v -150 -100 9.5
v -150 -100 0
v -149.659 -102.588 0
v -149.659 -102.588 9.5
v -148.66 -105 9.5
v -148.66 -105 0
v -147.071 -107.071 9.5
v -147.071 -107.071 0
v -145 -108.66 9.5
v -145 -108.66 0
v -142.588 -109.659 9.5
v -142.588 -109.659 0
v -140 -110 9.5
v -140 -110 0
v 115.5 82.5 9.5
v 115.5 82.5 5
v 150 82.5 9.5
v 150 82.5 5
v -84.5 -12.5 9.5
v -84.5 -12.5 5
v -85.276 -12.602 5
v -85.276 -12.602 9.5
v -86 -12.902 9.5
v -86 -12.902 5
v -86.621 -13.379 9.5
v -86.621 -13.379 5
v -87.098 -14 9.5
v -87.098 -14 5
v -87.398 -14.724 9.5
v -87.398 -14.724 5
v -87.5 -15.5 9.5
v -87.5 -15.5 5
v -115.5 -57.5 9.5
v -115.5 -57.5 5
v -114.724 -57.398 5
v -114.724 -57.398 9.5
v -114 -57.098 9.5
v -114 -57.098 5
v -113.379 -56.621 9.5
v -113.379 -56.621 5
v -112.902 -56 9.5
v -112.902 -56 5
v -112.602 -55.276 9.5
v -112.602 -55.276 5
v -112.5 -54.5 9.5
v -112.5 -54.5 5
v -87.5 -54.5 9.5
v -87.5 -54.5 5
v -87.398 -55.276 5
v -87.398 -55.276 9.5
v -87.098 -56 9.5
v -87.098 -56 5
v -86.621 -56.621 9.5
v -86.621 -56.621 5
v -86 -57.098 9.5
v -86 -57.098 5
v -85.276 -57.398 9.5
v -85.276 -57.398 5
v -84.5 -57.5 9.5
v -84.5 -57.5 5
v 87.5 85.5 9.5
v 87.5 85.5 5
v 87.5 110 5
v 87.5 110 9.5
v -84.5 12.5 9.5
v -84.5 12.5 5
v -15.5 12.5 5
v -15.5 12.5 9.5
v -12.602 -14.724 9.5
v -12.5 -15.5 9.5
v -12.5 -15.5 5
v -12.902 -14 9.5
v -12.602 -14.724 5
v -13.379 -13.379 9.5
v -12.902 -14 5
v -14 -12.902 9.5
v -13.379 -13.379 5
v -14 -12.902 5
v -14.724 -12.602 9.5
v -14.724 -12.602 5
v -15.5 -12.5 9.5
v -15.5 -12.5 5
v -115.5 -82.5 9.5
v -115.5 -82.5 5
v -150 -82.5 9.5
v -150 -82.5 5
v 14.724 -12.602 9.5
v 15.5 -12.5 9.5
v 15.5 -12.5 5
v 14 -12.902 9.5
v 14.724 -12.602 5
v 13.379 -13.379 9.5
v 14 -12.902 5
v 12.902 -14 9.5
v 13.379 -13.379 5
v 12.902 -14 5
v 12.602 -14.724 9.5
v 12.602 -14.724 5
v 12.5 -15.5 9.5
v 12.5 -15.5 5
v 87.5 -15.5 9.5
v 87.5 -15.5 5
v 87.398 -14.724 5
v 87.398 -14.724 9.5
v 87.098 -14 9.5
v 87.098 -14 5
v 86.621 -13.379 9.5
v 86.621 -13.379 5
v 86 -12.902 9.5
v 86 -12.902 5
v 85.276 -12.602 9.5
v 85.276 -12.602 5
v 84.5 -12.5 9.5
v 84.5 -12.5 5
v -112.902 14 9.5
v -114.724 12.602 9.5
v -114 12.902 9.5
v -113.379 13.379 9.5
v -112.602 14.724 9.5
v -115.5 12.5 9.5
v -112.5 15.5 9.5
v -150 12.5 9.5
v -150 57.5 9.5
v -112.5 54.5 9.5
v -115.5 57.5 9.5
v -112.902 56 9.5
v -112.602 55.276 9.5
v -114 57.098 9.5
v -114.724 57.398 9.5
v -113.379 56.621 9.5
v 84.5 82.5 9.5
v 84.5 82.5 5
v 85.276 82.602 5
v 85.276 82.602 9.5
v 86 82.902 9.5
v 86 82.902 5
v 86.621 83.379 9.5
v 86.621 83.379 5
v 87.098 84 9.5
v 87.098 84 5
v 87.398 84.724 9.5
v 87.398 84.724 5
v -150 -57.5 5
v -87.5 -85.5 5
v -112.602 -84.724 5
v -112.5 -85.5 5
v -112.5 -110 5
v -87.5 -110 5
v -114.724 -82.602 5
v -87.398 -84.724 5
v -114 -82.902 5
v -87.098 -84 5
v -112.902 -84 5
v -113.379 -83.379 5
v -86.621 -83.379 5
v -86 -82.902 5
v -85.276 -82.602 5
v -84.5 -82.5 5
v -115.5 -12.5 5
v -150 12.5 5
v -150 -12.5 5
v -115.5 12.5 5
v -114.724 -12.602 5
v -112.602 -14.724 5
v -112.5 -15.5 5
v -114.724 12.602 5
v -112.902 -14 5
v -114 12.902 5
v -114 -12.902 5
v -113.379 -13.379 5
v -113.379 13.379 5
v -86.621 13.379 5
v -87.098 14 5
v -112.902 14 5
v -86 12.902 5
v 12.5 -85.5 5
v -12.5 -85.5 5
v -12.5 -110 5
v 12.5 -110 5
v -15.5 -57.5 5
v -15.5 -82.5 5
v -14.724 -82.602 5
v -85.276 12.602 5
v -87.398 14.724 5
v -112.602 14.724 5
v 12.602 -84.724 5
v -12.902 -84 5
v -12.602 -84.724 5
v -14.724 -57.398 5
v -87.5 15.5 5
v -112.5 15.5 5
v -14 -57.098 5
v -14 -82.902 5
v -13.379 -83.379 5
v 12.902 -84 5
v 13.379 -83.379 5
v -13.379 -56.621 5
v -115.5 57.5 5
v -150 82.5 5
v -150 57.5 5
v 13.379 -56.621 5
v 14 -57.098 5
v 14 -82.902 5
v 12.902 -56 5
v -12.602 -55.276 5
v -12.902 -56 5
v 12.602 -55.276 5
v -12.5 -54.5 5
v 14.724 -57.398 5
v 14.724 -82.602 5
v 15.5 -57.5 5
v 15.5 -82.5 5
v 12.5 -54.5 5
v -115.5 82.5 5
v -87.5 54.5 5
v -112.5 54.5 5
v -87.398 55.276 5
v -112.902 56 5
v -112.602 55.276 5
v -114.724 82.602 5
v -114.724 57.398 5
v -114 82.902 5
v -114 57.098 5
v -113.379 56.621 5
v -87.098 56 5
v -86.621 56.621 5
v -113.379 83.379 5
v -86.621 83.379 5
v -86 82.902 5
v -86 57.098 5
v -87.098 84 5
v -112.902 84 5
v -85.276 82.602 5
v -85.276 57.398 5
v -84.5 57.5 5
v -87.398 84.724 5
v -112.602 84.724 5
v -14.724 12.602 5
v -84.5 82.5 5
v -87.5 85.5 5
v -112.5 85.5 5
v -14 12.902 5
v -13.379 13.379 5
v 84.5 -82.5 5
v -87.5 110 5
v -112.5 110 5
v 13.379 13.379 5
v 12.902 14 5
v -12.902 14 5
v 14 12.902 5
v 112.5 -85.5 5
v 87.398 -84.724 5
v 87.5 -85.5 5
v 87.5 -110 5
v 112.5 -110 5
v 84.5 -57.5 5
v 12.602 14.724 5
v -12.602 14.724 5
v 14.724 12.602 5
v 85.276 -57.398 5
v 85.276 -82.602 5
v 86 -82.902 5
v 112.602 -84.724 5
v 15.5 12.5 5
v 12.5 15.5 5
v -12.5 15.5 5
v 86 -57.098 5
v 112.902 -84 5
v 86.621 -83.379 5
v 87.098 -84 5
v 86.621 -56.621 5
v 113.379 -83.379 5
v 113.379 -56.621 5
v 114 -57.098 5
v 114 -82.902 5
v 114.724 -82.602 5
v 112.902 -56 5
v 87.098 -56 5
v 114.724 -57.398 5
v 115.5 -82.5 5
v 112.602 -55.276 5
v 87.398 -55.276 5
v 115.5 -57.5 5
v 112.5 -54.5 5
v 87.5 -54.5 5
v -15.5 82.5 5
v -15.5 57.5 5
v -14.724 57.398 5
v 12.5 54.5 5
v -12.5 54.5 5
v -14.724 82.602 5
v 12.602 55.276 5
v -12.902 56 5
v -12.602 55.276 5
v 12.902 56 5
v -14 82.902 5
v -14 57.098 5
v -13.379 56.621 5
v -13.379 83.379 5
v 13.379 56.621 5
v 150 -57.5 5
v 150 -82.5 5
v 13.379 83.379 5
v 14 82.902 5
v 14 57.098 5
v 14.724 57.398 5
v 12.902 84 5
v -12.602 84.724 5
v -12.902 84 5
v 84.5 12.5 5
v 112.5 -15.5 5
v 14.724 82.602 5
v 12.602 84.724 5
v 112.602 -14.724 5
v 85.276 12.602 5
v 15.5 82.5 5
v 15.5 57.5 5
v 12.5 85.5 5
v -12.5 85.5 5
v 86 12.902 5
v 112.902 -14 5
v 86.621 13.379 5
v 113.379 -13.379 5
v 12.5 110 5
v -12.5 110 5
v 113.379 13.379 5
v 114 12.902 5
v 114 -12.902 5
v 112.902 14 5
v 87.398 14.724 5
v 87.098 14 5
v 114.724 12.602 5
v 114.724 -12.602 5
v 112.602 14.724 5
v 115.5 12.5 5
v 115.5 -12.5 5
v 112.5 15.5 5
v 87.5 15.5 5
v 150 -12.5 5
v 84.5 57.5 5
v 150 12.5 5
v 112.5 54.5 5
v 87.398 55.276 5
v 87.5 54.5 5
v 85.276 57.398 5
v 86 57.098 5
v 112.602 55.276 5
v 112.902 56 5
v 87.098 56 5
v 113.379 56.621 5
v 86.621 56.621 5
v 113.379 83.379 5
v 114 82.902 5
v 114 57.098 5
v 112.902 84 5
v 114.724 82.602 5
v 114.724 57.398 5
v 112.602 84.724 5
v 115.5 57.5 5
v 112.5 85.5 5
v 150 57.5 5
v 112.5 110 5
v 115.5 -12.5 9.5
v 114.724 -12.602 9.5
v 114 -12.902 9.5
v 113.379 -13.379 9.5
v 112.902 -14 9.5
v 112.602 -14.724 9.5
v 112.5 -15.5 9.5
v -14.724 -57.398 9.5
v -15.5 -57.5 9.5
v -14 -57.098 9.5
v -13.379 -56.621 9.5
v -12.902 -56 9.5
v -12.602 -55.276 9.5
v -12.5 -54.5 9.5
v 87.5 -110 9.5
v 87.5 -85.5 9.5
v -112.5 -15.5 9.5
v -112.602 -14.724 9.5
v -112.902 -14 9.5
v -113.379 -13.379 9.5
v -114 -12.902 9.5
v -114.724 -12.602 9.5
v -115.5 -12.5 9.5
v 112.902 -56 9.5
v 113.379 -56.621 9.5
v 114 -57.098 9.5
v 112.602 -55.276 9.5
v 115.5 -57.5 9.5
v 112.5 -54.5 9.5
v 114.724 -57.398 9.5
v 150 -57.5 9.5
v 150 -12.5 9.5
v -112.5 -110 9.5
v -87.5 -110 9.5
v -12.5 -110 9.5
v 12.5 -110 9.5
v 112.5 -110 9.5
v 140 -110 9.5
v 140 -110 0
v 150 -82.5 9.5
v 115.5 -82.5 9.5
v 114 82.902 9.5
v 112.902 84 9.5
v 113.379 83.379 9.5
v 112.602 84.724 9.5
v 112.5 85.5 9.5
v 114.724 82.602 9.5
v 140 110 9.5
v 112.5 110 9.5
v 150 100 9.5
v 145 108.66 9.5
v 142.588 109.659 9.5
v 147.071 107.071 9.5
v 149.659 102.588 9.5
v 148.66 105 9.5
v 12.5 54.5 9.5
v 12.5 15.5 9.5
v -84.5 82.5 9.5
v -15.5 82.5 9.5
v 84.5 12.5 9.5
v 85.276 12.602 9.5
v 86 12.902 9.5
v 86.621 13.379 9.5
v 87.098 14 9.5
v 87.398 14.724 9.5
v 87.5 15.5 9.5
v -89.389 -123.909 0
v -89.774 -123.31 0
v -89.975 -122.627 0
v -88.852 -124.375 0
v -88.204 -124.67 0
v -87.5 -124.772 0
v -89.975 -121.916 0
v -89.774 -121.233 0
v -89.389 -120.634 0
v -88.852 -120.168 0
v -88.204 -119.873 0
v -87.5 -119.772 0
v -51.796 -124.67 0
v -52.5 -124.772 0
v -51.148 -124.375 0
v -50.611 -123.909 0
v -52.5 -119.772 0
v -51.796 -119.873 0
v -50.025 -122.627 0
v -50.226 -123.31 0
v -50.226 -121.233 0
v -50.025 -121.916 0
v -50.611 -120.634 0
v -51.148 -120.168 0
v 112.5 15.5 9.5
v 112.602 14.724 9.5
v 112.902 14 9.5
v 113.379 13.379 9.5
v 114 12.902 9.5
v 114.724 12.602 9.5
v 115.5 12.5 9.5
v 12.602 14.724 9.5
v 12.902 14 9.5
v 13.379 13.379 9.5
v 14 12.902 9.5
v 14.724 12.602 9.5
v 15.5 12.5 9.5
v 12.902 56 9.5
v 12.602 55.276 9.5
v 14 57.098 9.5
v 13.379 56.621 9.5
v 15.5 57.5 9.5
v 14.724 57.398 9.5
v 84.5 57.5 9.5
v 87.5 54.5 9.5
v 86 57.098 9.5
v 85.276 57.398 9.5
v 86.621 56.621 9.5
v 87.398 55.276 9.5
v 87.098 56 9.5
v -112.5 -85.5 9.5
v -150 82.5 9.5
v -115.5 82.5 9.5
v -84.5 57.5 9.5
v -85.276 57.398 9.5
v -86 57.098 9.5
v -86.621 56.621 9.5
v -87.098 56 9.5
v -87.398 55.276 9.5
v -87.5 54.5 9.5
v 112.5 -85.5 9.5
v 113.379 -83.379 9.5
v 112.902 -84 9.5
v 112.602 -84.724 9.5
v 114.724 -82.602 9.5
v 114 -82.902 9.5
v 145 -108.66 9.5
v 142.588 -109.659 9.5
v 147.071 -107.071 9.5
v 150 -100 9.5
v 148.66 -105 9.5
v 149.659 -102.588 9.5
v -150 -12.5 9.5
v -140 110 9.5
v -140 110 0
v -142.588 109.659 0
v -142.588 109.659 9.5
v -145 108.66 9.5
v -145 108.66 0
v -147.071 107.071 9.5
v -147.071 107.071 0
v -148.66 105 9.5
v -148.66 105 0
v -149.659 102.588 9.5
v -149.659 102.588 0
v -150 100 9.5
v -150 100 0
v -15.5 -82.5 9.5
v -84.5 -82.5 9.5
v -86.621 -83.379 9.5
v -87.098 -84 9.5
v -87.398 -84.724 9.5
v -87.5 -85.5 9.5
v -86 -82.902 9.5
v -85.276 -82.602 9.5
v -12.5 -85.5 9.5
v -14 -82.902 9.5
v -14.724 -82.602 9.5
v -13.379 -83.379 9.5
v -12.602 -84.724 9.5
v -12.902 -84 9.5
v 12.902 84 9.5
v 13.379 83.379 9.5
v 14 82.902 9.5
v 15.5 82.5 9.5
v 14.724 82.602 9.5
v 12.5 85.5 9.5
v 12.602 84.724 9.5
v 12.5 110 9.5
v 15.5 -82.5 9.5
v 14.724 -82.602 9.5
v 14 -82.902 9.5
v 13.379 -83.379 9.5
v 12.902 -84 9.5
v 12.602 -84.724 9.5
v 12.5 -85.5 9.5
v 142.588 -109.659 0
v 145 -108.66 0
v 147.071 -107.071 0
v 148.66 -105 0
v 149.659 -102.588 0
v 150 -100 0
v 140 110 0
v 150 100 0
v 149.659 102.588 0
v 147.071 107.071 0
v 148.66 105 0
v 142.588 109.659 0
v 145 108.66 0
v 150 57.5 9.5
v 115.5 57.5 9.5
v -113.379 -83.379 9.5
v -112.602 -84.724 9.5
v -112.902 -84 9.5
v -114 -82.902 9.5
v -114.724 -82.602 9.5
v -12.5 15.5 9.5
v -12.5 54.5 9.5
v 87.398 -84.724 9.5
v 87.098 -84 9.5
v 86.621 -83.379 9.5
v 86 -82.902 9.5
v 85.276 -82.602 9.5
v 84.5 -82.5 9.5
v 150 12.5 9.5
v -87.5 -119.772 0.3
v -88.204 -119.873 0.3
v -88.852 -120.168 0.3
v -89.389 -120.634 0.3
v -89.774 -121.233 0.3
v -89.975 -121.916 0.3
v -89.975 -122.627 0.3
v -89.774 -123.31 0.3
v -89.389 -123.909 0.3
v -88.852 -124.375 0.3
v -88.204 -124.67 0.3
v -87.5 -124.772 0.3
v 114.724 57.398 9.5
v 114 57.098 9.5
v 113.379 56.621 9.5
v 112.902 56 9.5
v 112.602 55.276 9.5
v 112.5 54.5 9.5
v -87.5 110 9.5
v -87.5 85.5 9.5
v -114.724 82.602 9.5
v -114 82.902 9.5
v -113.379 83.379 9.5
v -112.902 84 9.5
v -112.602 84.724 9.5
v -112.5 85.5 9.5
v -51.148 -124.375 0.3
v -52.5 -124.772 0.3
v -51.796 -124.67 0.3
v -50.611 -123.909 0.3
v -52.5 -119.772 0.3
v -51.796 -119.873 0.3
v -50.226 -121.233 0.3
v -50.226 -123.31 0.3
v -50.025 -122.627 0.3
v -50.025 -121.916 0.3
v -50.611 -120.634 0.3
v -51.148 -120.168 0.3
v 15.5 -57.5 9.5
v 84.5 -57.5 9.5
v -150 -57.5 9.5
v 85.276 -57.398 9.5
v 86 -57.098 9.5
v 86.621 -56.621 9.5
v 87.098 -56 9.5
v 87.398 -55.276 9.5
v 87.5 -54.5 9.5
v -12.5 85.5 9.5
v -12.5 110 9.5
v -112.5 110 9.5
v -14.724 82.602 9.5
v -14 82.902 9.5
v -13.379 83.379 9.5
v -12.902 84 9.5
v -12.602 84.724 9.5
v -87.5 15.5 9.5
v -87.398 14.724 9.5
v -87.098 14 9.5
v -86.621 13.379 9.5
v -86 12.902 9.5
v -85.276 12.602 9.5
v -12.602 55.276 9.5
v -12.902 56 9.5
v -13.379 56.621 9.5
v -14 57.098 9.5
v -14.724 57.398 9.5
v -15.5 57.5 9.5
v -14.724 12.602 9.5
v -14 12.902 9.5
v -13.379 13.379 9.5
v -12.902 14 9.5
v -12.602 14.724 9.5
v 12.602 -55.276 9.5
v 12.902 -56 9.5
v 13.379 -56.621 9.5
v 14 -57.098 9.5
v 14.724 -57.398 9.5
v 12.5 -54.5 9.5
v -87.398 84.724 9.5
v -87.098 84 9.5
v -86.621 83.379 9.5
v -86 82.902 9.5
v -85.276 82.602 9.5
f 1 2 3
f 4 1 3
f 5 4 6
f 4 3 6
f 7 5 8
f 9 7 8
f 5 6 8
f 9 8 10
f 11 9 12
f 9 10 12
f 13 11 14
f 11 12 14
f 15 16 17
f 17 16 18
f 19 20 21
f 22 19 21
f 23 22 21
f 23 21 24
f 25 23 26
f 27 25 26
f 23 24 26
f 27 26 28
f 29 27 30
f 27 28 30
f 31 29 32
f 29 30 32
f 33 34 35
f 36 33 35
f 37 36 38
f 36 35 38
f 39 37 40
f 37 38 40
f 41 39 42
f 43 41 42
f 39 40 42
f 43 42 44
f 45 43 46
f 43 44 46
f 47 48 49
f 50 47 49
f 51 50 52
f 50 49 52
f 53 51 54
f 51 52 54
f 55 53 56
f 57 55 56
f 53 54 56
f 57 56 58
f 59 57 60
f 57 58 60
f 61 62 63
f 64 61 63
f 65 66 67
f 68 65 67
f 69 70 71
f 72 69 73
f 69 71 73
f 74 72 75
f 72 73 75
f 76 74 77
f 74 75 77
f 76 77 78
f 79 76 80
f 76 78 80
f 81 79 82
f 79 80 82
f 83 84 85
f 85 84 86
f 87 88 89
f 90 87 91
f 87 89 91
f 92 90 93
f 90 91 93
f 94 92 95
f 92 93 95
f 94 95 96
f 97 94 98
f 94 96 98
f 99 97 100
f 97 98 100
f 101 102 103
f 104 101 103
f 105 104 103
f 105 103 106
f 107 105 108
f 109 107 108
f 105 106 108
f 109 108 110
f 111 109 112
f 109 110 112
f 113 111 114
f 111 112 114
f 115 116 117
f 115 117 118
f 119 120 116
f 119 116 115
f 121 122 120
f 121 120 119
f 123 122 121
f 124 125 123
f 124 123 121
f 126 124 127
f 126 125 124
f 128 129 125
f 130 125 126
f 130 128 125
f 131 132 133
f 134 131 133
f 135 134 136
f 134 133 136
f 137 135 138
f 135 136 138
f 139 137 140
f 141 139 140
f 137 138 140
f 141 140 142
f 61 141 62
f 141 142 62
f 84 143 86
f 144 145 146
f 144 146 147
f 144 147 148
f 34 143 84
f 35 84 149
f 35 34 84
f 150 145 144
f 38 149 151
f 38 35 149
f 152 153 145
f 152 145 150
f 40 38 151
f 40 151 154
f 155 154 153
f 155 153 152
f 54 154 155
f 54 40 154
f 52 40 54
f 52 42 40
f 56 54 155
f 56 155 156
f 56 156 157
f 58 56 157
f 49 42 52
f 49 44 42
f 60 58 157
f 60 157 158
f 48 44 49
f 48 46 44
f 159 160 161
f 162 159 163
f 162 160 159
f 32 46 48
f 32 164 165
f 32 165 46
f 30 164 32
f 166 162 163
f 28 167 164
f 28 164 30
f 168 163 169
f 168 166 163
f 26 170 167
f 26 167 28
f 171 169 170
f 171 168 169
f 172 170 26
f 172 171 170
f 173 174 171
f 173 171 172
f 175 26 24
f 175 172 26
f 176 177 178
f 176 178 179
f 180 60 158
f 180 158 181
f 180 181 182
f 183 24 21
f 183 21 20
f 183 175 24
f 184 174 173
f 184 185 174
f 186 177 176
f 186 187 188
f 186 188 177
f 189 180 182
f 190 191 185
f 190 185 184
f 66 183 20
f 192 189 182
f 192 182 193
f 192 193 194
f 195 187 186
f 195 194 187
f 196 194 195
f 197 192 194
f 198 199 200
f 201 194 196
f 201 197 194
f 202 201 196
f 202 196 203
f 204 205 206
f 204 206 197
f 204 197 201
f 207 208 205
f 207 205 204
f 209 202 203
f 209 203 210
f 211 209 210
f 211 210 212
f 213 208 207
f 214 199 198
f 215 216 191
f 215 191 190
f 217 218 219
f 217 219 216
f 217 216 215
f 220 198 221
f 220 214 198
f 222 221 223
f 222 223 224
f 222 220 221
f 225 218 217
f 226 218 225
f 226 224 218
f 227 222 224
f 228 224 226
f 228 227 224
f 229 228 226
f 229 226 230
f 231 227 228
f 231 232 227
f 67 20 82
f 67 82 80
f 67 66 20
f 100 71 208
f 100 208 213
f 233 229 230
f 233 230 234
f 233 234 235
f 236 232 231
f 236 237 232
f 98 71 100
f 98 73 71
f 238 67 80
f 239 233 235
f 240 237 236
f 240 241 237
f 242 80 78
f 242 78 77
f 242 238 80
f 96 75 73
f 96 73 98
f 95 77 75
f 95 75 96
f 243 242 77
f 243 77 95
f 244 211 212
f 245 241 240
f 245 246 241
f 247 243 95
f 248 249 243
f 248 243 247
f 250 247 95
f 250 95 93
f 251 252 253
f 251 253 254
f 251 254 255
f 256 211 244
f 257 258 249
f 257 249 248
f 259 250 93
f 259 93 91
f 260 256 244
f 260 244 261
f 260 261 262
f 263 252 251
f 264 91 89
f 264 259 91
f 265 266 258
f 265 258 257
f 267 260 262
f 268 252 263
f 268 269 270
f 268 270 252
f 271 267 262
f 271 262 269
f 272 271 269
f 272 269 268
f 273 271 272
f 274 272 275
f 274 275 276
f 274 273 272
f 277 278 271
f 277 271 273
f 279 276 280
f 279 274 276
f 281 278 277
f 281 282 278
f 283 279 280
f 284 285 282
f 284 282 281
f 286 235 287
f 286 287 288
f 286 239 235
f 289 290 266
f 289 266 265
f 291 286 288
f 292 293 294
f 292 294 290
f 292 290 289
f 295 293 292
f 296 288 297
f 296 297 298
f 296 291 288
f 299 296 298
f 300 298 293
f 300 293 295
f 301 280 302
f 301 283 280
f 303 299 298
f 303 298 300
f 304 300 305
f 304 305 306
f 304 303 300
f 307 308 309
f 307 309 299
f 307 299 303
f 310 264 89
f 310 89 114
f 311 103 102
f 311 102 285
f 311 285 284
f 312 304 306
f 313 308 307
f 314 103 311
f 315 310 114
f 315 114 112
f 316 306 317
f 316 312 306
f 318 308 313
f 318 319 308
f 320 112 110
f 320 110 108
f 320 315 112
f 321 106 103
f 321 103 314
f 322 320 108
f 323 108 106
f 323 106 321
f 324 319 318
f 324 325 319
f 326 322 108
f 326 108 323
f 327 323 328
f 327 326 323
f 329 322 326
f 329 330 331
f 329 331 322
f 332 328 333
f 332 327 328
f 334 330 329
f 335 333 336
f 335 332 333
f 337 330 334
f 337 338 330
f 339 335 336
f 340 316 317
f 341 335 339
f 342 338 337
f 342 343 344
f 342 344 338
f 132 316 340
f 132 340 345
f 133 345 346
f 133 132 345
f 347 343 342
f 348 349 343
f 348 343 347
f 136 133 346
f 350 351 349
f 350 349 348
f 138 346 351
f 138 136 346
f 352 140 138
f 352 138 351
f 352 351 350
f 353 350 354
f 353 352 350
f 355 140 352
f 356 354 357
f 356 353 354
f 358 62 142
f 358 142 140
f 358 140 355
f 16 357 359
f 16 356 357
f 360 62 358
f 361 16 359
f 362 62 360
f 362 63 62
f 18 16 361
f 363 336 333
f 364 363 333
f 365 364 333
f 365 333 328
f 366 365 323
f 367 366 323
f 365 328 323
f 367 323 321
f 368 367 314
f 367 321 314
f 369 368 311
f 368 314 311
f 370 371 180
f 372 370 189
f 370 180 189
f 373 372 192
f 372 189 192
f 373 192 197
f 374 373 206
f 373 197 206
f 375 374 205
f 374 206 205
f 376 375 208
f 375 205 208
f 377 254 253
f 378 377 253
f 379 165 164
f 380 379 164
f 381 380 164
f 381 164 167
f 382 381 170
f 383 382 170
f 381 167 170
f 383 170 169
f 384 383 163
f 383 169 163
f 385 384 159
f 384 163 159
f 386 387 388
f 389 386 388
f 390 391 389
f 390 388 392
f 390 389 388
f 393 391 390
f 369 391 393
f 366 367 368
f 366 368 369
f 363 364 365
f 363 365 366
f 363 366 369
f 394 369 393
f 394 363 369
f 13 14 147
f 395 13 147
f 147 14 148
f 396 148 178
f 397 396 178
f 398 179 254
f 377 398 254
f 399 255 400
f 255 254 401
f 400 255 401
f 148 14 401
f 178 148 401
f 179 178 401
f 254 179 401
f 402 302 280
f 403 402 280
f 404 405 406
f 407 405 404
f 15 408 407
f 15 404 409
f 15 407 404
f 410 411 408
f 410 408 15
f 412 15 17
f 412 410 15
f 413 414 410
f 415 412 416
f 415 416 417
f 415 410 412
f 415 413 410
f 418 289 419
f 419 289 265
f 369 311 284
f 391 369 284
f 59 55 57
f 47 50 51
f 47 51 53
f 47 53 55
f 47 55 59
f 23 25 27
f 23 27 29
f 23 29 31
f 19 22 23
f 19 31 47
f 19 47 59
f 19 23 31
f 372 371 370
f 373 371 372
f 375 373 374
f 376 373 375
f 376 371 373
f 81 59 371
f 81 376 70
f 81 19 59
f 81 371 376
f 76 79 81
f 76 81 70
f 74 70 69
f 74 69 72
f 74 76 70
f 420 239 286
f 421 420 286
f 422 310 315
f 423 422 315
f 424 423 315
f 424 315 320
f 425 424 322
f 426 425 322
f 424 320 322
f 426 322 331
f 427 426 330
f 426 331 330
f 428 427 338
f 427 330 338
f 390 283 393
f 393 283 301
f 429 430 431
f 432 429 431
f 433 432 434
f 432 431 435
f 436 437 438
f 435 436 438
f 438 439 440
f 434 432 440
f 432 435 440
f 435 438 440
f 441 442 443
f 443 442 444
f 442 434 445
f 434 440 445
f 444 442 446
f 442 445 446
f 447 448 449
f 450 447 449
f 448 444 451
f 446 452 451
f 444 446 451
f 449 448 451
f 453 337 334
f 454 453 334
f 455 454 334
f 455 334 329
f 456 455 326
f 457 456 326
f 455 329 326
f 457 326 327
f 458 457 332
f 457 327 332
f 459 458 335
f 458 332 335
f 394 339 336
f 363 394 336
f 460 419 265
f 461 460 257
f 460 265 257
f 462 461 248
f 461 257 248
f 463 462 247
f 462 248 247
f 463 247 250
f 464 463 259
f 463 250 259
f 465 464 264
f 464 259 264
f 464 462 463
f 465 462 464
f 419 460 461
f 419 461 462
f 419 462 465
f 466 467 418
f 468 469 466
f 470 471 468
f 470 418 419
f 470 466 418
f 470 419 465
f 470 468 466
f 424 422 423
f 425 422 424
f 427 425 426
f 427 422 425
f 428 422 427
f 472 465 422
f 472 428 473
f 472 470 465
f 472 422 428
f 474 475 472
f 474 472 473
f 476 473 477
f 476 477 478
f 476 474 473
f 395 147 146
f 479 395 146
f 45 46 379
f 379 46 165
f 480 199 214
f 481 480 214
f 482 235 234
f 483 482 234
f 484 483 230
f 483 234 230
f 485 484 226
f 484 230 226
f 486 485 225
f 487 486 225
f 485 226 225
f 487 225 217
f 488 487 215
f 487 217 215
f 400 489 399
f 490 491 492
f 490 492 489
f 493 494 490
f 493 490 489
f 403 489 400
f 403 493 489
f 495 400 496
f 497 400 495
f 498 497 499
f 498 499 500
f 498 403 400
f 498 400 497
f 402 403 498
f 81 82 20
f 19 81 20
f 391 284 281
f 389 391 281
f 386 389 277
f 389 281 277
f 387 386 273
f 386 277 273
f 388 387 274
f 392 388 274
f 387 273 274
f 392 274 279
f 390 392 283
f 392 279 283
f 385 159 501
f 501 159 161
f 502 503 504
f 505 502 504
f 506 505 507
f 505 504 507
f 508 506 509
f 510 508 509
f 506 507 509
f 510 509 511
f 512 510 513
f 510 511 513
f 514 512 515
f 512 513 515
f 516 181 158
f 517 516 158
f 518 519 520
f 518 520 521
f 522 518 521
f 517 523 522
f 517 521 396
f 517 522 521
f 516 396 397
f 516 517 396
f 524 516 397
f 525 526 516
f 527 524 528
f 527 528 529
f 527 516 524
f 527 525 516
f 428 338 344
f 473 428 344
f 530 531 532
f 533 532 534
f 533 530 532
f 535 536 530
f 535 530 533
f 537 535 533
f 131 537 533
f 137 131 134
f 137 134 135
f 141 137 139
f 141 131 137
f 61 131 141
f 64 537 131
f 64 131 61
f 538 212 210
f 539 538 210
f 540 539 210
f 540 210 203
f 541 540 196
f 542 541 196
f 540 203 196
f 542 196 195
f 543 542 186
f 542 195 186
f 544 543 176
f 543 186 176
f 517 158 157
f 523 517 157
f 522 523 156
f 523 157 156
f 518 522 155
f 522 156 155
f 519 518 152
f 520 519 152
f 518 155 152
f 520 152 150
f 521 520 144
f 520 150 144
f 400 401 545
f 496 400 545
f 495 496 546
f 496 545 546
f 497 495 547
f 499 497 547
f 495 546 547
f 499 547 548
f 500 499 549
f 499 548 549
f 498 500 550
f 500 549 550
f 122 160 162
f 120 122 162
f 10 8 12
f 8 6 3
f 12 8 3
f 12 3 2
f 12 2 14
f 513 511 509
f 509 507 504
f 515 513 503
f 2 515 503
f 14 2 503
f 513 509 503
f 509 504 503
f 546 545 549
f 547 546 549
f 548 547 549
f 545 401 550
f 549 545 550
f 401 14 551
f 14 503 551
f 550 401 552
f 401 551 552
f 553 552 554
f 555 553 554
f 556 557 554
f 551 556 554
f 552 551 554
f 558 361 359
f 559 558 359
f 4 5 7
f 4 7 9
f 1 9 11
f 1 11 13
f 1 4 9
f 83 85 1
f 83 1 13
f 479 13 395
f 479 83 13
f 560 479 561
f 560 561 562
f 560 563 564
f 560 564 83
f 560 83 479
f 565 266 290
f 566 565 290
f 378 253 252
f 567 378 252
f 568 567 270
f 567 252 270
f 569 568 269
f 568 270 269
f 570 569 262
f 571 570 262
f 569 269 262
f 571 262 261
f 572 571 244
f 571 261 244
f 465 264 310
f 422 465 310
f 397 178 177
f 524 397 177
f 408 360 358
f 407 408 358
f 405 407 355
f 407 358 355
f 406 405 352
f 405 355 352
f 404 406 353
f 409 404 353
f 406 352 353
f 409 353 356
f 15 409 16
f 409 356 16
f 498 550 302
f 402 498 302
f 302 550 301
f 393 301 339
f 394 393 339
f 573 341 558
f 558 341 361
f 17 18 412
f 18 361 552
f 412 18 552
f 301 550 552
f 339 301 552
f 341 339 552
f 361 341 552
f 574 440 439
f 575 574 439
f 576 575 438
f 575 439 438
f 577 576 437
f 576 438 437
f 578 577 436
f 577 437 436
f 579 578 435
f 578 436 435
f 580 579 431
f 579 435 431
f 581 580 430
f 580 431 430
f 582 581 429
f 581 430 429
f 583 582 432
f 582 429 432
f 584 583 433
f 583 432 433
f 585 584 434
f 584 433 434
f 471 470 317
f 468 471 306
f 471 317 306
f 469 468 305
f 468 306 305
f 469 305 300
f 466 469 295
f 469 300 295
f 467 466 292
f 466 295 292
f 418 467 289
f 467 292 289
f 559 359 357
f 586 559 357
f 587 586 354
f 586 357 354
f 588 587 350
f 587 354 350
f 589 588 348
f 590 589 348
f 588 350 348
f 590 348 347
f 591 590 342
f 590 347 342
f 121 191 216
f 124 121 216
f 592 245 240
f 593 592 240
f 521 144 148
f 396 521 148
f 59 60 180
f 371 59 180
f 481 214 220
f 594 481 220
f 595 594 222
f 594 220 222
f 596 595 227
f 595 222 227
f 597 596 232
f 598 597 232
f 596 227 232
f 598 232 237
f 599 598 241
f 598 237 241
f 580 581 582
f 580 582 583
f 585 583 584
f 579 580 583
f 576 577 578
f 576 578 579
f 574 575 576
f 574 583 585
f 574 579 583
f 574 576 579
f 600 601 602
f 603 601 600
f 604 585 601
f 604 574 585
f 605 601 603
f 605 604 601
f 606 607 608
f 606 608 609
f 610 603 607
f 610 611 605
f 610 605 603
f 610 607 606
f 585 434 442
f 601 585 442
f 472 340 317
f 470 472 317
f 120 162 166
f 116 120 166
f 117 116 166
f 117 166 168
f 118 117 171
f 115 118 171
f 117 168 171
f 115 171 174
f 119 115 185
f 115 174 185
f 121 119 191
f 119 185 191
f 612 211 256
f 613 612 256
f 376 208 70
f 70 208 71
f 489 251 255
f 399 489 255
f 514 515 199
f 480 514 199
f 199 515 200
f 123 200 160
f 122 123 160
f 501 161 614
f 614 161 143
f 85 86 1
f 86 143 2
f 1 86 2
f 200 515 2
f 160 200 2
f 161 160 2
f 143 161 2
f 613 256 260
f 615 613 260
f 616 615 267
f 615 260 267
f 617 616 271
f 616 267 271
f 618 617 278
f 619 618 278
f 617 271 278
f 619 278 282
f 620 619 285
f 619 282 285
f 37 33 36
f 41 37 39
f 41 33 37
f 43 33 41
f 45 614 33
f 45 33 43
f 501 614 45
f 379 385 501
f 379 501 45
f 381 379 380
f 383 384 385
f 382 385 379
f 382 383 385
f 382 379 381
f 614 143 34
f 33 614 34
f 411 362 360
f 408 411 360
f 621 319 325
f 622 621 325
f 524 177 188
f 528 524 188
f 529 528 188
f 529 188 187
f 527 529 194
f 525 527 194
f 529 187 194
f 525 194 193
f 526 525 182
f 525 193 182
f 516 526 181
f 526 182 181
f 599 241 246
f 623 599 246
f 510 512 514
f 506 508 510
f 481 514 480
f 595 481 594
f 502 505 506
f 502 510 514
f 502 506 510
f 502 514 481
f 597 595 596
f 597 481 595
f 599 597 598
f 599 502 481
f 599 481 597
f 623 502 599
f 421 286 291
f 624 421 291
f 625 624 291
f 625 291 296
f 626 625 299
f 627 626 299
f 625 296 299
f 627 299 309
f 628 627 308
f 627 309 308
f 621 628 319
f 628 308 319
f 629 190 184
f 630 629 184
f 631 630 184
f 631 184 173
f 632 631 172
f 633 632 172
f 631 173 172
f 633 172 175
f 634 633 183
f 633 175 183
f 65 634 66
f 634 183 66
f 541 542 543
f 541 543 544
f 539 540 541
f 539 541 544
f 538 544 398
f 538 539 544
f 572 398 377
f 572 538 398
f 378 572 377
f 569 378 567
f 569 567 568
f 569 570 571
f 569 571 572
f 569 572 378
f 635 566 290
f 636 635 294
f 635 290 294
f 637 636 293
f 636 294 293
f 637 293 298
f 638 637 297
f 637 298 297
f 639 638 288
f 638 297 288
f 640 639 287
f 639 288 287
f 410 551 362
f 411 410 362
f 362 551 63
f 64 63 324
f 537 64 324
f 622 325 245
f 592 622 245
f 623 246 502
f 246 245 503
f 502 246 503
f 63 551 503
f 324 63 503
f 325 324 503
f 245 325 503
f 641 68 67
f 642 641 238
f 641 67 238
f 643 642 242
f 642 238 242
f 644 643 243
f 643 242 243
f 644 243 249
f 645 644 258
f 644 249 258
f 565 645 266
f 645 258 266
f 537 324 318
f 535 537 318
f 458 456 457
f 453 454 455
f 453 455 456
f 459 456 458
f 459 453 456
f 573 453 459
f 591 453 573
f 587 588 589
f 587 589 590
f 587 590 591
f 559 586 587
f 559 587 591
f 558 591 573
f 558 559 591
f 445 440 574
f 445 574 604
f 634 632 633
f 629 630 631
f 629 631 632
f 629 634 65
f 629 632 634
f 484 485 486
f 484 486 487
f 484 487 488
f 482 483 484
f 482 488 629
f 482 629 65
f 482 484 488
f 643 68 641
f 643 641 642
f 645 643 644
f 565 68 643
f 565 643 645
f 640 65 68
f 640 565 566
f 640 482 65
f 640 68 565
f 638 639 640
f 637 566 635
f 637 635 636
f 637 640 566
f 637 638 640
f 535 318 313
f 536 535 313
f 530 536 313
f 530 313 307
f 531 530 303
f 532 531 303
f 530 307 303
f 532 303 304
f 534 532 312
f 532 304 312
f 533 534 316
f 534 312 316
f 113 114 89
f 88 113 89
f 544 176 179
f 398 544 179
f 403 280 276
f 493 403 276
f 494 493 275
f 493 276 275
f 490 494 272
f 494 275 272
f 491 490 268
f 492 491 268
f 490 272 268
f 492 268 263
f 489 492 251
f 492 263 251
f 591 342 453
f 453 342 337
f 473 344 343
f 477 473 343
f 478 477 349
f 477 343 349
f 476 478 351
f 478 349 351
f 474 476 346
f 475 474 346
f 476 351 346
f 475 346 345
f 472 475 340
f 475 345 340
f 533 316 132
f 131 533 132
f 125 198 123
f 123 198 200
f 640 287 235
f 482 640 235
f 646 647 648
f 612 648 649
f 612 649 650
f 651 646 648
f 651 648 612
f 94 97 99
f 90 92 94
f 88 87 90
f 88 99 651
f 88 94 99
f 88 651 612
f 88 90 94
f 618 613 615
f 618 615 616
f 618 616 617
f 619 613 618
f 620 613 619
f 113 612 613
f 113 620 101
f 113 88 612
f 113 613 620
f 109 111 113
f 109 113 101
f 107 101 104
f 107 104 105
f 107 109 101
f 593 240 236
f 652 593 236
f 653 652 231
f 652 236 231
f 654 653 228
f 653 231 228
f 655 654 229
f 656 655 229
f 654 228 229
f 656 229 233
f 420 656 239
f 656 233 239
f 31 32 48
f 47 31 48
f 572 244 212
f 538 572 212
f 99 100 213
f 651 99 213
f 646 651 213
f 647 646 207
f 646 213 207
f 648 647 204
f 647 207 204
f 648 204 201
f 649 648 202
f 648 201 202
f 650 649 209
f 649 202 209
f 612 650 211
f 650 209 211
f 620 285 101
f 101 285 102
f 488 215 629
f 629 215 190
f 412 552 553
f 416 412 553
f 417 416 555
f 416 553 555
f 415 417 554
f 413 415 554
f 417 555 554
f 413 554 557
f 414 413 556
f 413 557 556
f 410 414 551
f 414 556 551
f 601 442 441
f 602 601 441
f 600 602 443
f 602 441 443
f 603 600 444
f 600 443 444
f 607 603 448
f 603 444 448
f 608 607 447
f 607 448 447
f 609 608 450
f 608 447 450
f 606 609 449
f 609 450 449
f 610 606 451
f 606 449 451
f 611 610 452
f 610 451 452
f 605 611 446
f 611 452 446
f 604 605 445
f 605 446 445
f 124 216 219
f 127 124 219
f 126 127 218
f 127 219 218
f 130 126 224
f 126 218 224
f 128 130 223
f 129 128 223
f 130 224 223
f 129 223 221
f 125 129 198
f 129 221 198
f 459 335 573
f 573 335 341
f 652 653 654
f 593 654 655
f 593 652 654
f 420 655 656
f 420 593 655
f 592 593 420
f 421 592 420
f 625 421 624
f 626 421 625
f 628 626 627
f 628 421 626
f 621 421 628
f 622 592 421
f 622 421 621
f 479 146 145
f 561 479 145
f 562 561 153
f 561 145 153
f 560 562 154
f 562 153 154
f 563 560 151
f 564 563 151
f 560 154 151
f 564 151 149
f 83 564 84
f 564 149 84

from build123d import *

# Parameters (mm, degrees)
F1_DEPTH = 5
F2_DEPTH = 9.5
F0_W     = 35
F0_H     = 5
F3_DEPTH = 0.3


with BuildPart() as f1:
    # F0 (on Top) → F1 (new body)
    with BuildSketch(Plane.XY):
        with BuildLine():
            Line((-150, 100), (-150, 82.5))
            Line((-150, 82.5), (-115.5, 82.5))
            ThreePointArc((-115.5, 82.5), (-113.37868, 83.37868), (-112.5, 85.5))
            Line((-112.5, 85.5), (-112.5, 110))
            Line((-112.5, 110), (-140, 110))
            ThreePointArc((-140, 110), (-147.071068, 107.071068), (-150, 100))
        make_face()
        with BuildLine():
            Line((87.5, -110), (112.5, -110))
            Line((112.5, -110), (112.5, -85.5))
            ThreePointArc((112.5, -85.5), (113.37868, -83.37868), (115.5, -82.5))
            Line((115.5, -82.5), (150, -82.5))
            Line((150, -82.5), (150, -57.5))
            Line((150, -57.5), (115.5, -57.5))
            ThreePointArc((115.5, -57.5), (113.37868, -56.62132), (112.5, -54.5))
            Line((112.5, -54.5), (112.5, -15.5))
            ThreePointArc((112.5, -15.5), (113.37868, -13.37868), (115.5, -12.5))
            Line((115.5, -12.5), (150, -12.5))
            Line((150, -12.5), (150, 12.5))
            Line((150, 12.5), (115.5, 12.5))
            ThreePointArc((115.5, 12.5), (113.37868, 13.37868), (112.5, 15.5))
            Line((112.5, 15.5), (112.5, 54.5))
            ThreePointArc((112.5, 54.5), (113.37868, 56.62132), (115.5, 57.5))
            Line((115.5, 57.5), (150, 57.5))
            Line((150, 57.5), (150, 82.5))
            Line((150, 82.5), (115.5, 82.5))
            ThreePointArc((115.5, 82.5), (113.37868, 83.37868), (112.5, 85.5))
            Line((112.5, 85.5), (112.5, 110))
            Line((112.5, 110), (87.5, 110))
            Line((87.5, 110), (87.5, 85.5))
            ThreePointArc((87.5, 85.5), (86.62132, 83.37868), (84.5, 82.5))
            Line((84.5, 82.5), (15.5, 82.5))
            ThreePointArc((15.5, 82.5), (13.37868, 83.37868), (12.5, 85.5))
            Line((12.5, 85.5), (12.5, 110))
            Line((12.5, 110), (-12.5, 110))
            Line((-12.5, 110), (-12.5, 85.5))
            ThreePointArc((-12.5, 85.5), (-13.37868, 83.37868), (-15.5, 82.5))
            Line((-15.5, 82.5), (-84.5, 82.5))
            ThreePointArc((-84.5, 82.5), (-86.62132, 83.37868), (-87.5, 85.5))
            Line((-87.5, 85.5), (-87.5, 110))
            Line((-87.5, 110), (-112.5, 110))
            Line((-112.5, 110), (-112.5, 85.5))
            ThreePointArc((-112.5, 85.5), (-113.37868, 83.37868), (-115.5, 82.5))
            Line((-115.5, 82.5), (-150, 82.5))
            Line((-150, 82.5), (-150, 57.5))
            Line((-150, 57.5), (-115.5, 57.5))
            ThreePointArc((-115.5, 57.5), (-113.37868, 56.62132), (-112.5, 54.5))
            Line((-112.5, 54.5), (-112.5, 15.5))
            ThreePointArc((-112.5, 15.5), (-113.37868, 13.37868), (-115.5, 12.5))
            Line((-115.5, 12.5), (-150, 12.5))
            Line((-150, 12.5), (-150, -12.5))
            Line((-150, -12.5), (-115.5, -12.5))
            ThreePointArc((-115.5, -12.5), (-113.37868, -13.37868), (-112.5, -15.5))
            Line((-112.5, -15.5), (-112.5, -54.5))
            ThreePointArc((-112.5, -54.5), (-113.37868, -56.62132), (-115.5, -57.5))
            Line((-115.5, -57.5), (-150, -57.5))
            Line((-150, -57.5), (-150, -82.5))
            Line((-150, -82.5), (-115.5, -82.5))
            ThreePointArc((-115.5, -82.5), (-113.37868, -83.37868), (-112.5, -85.5))
            Line((-112.5, -85.5), (-112.5, -110))
            Line((-112.5, -110), (-87.5, -110))
            Line((-87.5, -110), (-87.5, -85.5))
            ThreePointArc((-87.5, -85.5), (-86.62132, -83.37868), (-84.5, -82.5))
            Line((-84.5, -82.5), (-15.5, -82.5))
            ThreePointArc((-15.5, -82.5), (-13.37868, -83.37868), (-12.5, -85.5))
            Line((-12.5, -85.5), (-12.5, -110))
            Line((-12.5, -110), (12.5, -110))
            Line((12.5, -110), (12.5, -85.5))
            ThreePointArc((12.5, -85.5), (13.37868, -83.37868), (15.5, -82.5))
            Line((15.5, -82.5), (84.5, -82.5))
            ThreePointArc((84.5, -82.5), (86.62132, -83.37868), (87.5, -85.5))
            Line((87.5, -85.5), (87.5, -110))
        make_face()
        with BuildLine():
            ThreePointArc((-87.5, -15.5), (-86.62132, -13.37868), (-84.5, -12.5))
            Line((-84.5, -12.5), (-15.5, -12.5))
            ThreePointArc((-15.5, -12.5), (-13.37868, -13.37868), (-12.5, -15.5))
            Line((-12.5, -15.5), (-12.5, -54.5))
            ThreePointArc((-12.5, -54.5), (-13.37868, -56.62132), (-15.5, -57.5))
            Line((-15.5, -57.5), (-84.5, -57.5))
            ThreePointArc((-84.5, -57.5), (-86.62132, -56.62132), (-87.5, -54.5))
            Line((-87.5, -54.5), (-87.5, -15.5))
        make_face(mode=Mode.SUBTRACT)
        with BuildLine():
            Line((12.5, -54.5), (12.5, -15.5))
            ThreePointArc((12.5, -15.5), (13.37868, -13.37868), (15.5, -12.5))
            Line((15.5, -12.5), (84.5, -12.5))
            ThreePointArc((84.5, -12.5), (86.62132, -13.37868), (87.5, -15.5))
            Line((87.5, -15.5), (87.5, -54.5))
            ThreePointArc((87.5, -54.5), (86.62132, -56.62132), (84.5, -57.5))
            Line((84.5, -57.5), (15.5, -57.5))
            ThreePointArc((15.5, -57.5), (13.37868, -56.62132), (12.5, -54.5))
        make_face(mode=Mode.SUBTRACT)
        with BuildLine():
            ThreePointArc((-87.5, 54.5), (-86.62132, 56.62132), (-84.5, 57.5))
            Line((-84.5, 57.5), (-15.5, 57.5))
            ThreePointArc((-15.5, 57.5), (-13.37868, 56.62132), (-12.5, 54.5))
            Line((-12.5, 54.5), (-12.5, 15.5))
            ThreePointArc((-12.5, 15.5), (-13.37868, 13.37868), (-15.5, 12.5))
            Line((-15.5, 12.5), (-84.5, 12.5))
            ThreePointArc((-84.5, 12.5), (-86.62132, 13.37868), (-87.5, 15.5))
            Line((-87.5, 15.5), (-87.5, 54.5))
        make_face(mode=Mode.SUBTRACT)
        with BuildLine():
            Line((12.5, 15.5), (12.5, 54.5))
            ThreePointArc((12.5, 54.5), (13.37868, 56.62132), (15.5, 57.5))
            Line((15.5, 57.5), (84.5, 57.5))
            ThreePointArc((84.5, 57.5), (86.62132, 56.62132), (87.5, 54.5))
            Line((87.5, 54.5), (87.5, 15.5))
            ThreePointArc((87.5, 15.5), (86.62132, 13.37868), (84.5, 12.5))
            Line((84.5, 12.5), (15.5, 12.5))
            ThreePointArc((15.5, 12.5), (13.37868, 13.37868), (12.5, 15.5))
        make_face(mode=Mode.SUBTRACT)
        with BuildLine():
            Line((-12.5, 85.5), (-12.5, 110))
            Line((-12.5, 110), (-87.5, 110))
            Line((-87.5, 110), (-87.5, 85.5))
            ThreePointArc((-87.5, 85.5), (-86.62132, 83.37868), (-84.5, 82.5))
            Line((-84.5, 82.5), (-15.5, 82.5))
            ThreePointArc((-15.5, 82.5), (-13.37868, 83.37868), (-12.5, 85.5))
        make_face()
        with BuildLine():
            Line((87.5, 85.5), (87.5, 110))
            Line((87.5, 110), (12.5, 110))
            Line((12.5, 110), (12.5, 85.5))
            ThreePointArc((12.5, 85.5), (13.37868, 83.37868), (15.5, 82.5))
            Line((15.5, 82.5), (84.5, 82.5))
            ThreePointArc((84.5, 82.5), (86.62132, 83.37868), (87.5, 85.5))
        make_face()
        with BuildLine():
            Line((115.5, 82.5), (150, 82.5))
            Line((150, 82.5), (150, 100))
            ThreePointArc((150, 100), (147.071068, 107.071068), (140, 110))
            Line((140, 110), (112.5, 110))
            Line((112.5, 110), (112.5, 85.5))
            ThreePointArc((112.5, 85.5), (113.37868, 83.37868), (115.5, 82.5))
        make_face()
        with BuildLine():
            Line((115.5, 12.5), (150, 12.5))
            Line((150, 12.5), (150, 57.5))
            Line((150, 57.5), (115.5, 57.5))
            ThreePointArc((115.5, 57.5), (113.37868, 56.62132), (112.5, 54.5))
            Line((112.5, 54.5), (112.5, 15.5))
            ThreePointArc((112.5, 15.5), (113.37868, 13.37868), (115.5, 12.5))
        make_face()
        with BuildLine():
            ThreePointArc((15.5, 57.5), (13.37868, 56.62132), (12.5, 54.5))
            Line((12.5, 54.5), (12.5, 15.5))
            ThreePointArc((12.5, 15.5), (13.37868, 13.37868), (15.5, 12.5))
            Line((15.5, 12.5), (84.5, 12.5))
            ThreePointArc((84.5, 12.5), (86.62132, 13.37868), (87.5, 15.5))
            Line((87.5, 15.5), (87.5, 54.5))
            ThreePointArc((87.5, 54.5), (86.62132, 56.62132), (84.5, 57.5))
            Line((84.5, 57.5), (15.5, 57.5))
        make_face()
        with BuildLine():
            Line((-15.5, 57.5), (-84.5, 57.5))
            ThreePointArc((-84.5, 57.5), (-86.62132, 56.62132), (-87.5, 54.5))
            Line((-87.5, 54.5), (-87.5, 15.5))
            ThreePointArc((-87.5, 15.5), (-86.62132, 13.37868), (-84.5, 12.5))
            Line((-84.5, 12.5), (-15.5, 12.5))
            ThreePointArc((-15.5, 12.5), (-13.37868, 13.37868), (-12.5, 15.5))
            Line((-12.5, 15.5), (-12.5, 54.5))
            ThreePointArc((-12.5, 54.5), (-13.37868, 56.62132), (-15.5, 57.5))
        make_face()
        with BuildLine():
            Line((-150, 57.5), (-150, 12.5))
            Line((-150, 12.5), (-115.5, 12.5))
            ThreePointArc((-115.5, 12.5), (-113.37868, 13.37868), (-112.5, 15.5))
            Line((-112.5, 15.5), (-112.5, 54.5))
            ThreePointArc((-112.5, 54.5), (-113.37868, 56.62132), (-115.5, 57.5))
            Line((-115.5, 57.5), (-150, 57.5))
        make_face()
        with BuildLine():
            Line((-150, -12.5), (-150, -57.5))
            Line((-150, -57.5), (-115.5, -57.5))
            ThreePointArc((-115.5, -57.5), (-113.37868, -56.62132), (-112.5, -54.5))
            Line((-112.5, -54.5), (-112.5, -15.5))
            ThreePointArc((-112.5, -15.5), (-113.37868, -13.37868), (-115.5, -12.5))
            Line((-115.5, -12.5), (-150, -12.5))
        make_face()
        with BuildLine():
            Line((-15.5, -12.5), (-84.5, -12.5))
            ThreePointArc((-84.5, -12.5), (-86.62132, -13.37868), (-87.5, -15.5))
            Line((-87.5, -15.5), (-87.5, -54.5))
            ThreePointArc((-87.5, -54.5), (-86.62132, -56.62132), (-84.5, -57.5))
            Line((-84.5, -57.5), (-15.5, -57.5))
            ThreePointArc((-15.5, -57.5), (-13.37868, -56.62132), (-12.5, -54.5))
            Line((-12.5, -54.5), (-12.5, -15.5))
            ThreePointArc((-12.5, -15.5), (-13.37868, -13.37868), (-15.5, -12.5))
        make_face()
        with BuildLine():
            ThreePointArc((15.5, -12.5), (13.37868, -13.37868), (12.5, -15.5))
            Line((12.5, -15.5), (12.5, -54.5))
            ThreePointArc((12.5, -54.5), (13.37868, -56.62132), (15.5, -57.5))
            Line((15.5, -57.5), (84.5, -57.5))
            ThreePointArc((84.5, -57.5), (86.62132, -56.62132), (87.5, -54.5))
            Line((87.5, -54.5), (87.5, -15.5))
            ThreePointArc((87.5, -15.5), (86.62132, -13.37868), (84.5, -12.5))
            Line((84.5, -12.5), (15.5, -12.5))
        make_face()
        with BuildLine():
            Line((115.5, -57.5), (150, -57.5))
            Line((150, -57.5), (150, -12.5))
            Line((150, -12.5), (115.5, -12.5))
            ThreePointArc((115.5, -12.5), (113.37868, -13.37868), (112.5, -15.5))
            Line((112.5, -15.5), (112.5, -54.5))
            ThreePointArc((112.5, -54.5), (113.37868, -56.62132), (115.5, -57.5))
        make_face()
        with BuildLine():
            Line((112.5, -110), (140, -110))
            ThreePointArc((140, -110), (147.071068, -107.071068), (150, -100))
            Line((150, -100), (150, -82.5))
            Line((150, -82.5), (115.5, -82.5))
            ThreePointArc((115.5, -82.5), (113.37868, -83.37868), (112.5, -85.5))
            Line((112.5, -85.5), (112.5, -110))
        make_face()
        with BuildLine():
            Line((12.5, -110), (87.5, -110))
            Line((87.5, -110), (87.5, -85.5))
            ThreePointArc((87.5, -85.5), (86.62132, -83.37868), (84.5, -82.5))
            Line((84.5, -82.5), (15.5, -82.5))
            ThreePointArc((15.5, -82.5), (13.37868, -83.37868), (12.5, -85.5))
            Line((12.5, -85.5), (12.5, -110))
        make_face()
        with BuildLine():
            Line((-87.5, -110), (-12.5, -110))
            Line((-12.5, -110), (-12.5, -85.5))
            ThreePointArc((-12.5, -85.5), (-13.37868, -83.37868), (-15.5, -82.5))
            Line((-15.5, -82.5), (-84.5, -82.5))
            ThreePointArc((-84.5, -82.5), (-86.62132, -83.37868), (-87.5, -85.5))
            Line((-87.5, -85.5), (-87.5, -110))
        make_face()
        with BuildLine():
            Line((-140, -110), (-112.5, -110))
            Line((-112.5, -110), (-112.5, -85.5))
            ThreePointArc((-112.5, -85.5), (-113.37868, -83.37868), (-115.5, -82.5))
            Line((-115.5, -82.5), (-150, -82.5))
            Line((-150, -82.5), (-150, -100))
            ThreePointArc((-150, -100), (-147.071068, -107.071068), (-140, -110))
        make_face()
    extrude(amount=F1_DEPTH)

    # F0 (on Top) → F2 (join)
    with BuildSketch(Plane.XY):
        with BuildLine():
            Line((-150, 57.5), (-150, 12.5))
            Line((-150, 12.5), (-115.5, 12.5))
            ThreePointArc((-115.5, 12.5), (-113.37868, 13.37868), (-112.5, 15.5))
            Line((-112.5, 15.5), (-112.5, 54.5))
            ThreePointArc((-112.5, 54.5), (-113.37868, 56.62132), (-115.5, 57.5))
            Line((-115.5, 57.5), (-150, 57.5))
        make_face()
        with BuildLine():
            Line((-150, 100), (-150, 82.5))
            Line((-150, 82.5), (-115.5, 82.5))
            ThreePointArc((-115.5, 82.5), (-113.37868, 83.37868), (-112.5, 85.5))
            Line((-112.5, 85.5), (-112.5, 110))
            Line((-112.5, 110), (-140, 110))
            ThreePointArc((-140, 110), (-147.071068, 107.071068), (-150, 100))
        make_face()
        with BuildLine():
            Line((-12.5, 85.5), (-12.5, 110))
            Line((-12.5, 110), (-87.5, 110))
            Line((-87.5, 110), (-87.5, 85.5))
            ThreePointArc((-87.5, 85.5), (-86.62132, 83.37868), (-84.5, 82.5))
            Line((-84.5, 82.5), (-15.5, 82.5))
            ThreePointArc((-15.5, 82.5), (-13.37868, 83.37868), (-12.5, 85.5))
        make_face()
        with BuildLine():
            Line((-15.5, 57.5), (-84.5, 57.5))
            ThreePointArc((-84.5, 57.5), (-86.62132, 56.62132), (-87.5, 54.5))
            Line((-87.5, 54.5), (-87.5, 15.5))
            ThreePointArc((-87.5, 15.5), (-86.62132, 13.37868), (-84.5, 12.5))
            Line((-84.5, 12.5), (-15.5, 12.5))
            ThreePointArc((-15.5, 12.5), (-13.37868, 13.37868), (-12.5, 15.5))
            Line((-12.5, 15.5), (-12.5, 54.5))
            ThreePointArc((-12.5, 54.5), (-13.37868, 56.62132), (-15.5, 57.5))
        make_face()
        with BuildLine():
            Line((-15.5, -12.5), (-84.5, -12.5))
            ThreePointArc((-84.5, -12.5), (-86.62132, -13.37868), (-87.5, -15.5))
            Line((-87.5, -15.5), (-87.5, -54.5))
            ThreePointArc((-87.5, -54.5), (-86.62132, -56.62132), (-84.5, -57.5))
            Line((-84.5, -57.5), (-15.5, -57.5))
            ThreePointArc((-15.5, -57.5), (-13.37868, -56.62132), (-12.5, -54.5))
            Line((-12.5, -54.5), (-12.5, -15.5))
            ThreePointArc((-12.5, -15.5), (-13.37868, -13.37868), (-15.5, -12.5))
        make_face()
        with BuildLine():
            Line((-150, -12.5), (-150, -57.5))
            Line((-150, -57.5), (-115.5, -57.5))
            ThreePointArc((-115.5, -57.5), (-113.37868, -56.62132), (-112.5, -54.5))
            Line((-112.5, -54.5), (-112.5, -15.5))
            ThreePointArc((-112.5, -15.5), (-113.37868, -13.37868), (-115.5, -12.5))
            Line((-115.5, -12.5), (-150, -12.5))
        make_face()
        with BuildLine():
            Line((-140, -110), (-112.5, -110))
            Line((-112.5, -110), (-112.5, -85.5))
            ThreePointArc((-112.5, -85.5), (-113.37868, -83.37868), (-115.5, -82.5))
            Line((-115.5, -82.5), (-150, -82.5))
            Line((-150, -82.5), (-150, -100))
            ThreePointArc((-150, -100), (-147.071068, -107.071068), (-140, -110))
        make_face()
        with BuildLine():
            Line((-87.5, -110), (-12.5, -110))
            Line((-12.5, -110), (-12.5, -85.5))
            ThreePointArc((-12.5, -85.5), (-13.37868, -83.37868), (-15.5, -82.5))
            Line((-15.5, -82.5), (-84.5, -82.5))
            ThreePointArc((-84.5, -82.5), (-86.62132, -83.37868), (-87.5, -85.5))
            Line((-87.5, -85.5), (-87.5, -110))
        make_face()
        with BuildLine():
            Line((12.5, -110), (87.5, -110))
            Line((87.5, -110), (87.5, -85.5))
            ThreePointArc((87.5, -85.5), (86.62132, -83.37868), (84.5, -82.5))
            Line((84.5, -82.5), (15.5, -82.5))
            ThreePointArc((15.5, -82.5), (13.37868, -83.37868), (12.5, -85.5))
            Line((12.5, -85.5), (12.5, -110))
        make_face()
        with BuildLine():
            ThreePointArc((15.5, -12.5), (13.37868, -13.37868), (12.5, -15.5))
            Line((12.5, -15.5), (12.5, -54.5))
            ThreePointArc((12.5, -54.5), (13.37868, -56.62132), (15.5, -57.5))
            Line((15.5, -57.5), (84.5, -57.5))
            ThreePointArc((84.5, -57.5), (86.62132, -56.62132), (87.5, -54.5))
            Line((87.5, -54.5), (87.5, -15.5))
            ThreePointArc((87.5, -15.5), (86.62132, -13.37868), (84.5, -12.5))
            Line((84.5, -12.5), (15.5, -12.5))
        make_face()
        with BuildLine():
            ThreePointArc((15.5, 57.5), (13.37868, 56.62132), (12.5, 54.5))
            Line((12.5, 54.5), (12.5, 15.5))
            ThreePointArc((12.5, 15.5), (13.37868, 13.37868), (15.5, 12.5))
            Line((15.5, 12.5), (84.5, 12.5))
            ThreePointArc((84.5, 12.5), (86.62132, 13.37868), (87.5, 15.5))
            Line((87.5, 15.5), (87.5, 54.5))
            ThreePointArc((87.5, 54.5), (86.62132, 56.62132), (84.5, 57.5))
            Line((84.5, 57.5), (15.5, 57.5))
        make_face()
        with BuildLine():
            Line((87.5, 85.5), (87.5, 110))
            Line((87.5, 110), (12.5, 110))
            Line((12.5, 110), (12.5, 85.5))
            ThreePointArc((12.5, 85.5), (13.37868, 83.37868), (15.5, 82.5))
            Line((15.5, 82.5), (84.5, 82.5))
            ThreePointArc((84.5, 82.5), (86.62132, 83.37868), (87.5, 85.5))
        make_face()
        with BuildLine():
            Line((115.5, 82.5), (150, 82.5))
            Line((150, 82.5), (150, 100))
            ThreePointArc((150, 100), (147.071068, 107.071068), (140, 110))
            Line((140, 110), (112.5, 110))
            Line((112.5, 110), (112.5, 85.5))
            ThreePointArc((112.5, 85.5), (113.37868, 83.37868), (115.5, 82.5))
        make_face()
        with BuildLine():
            Line((115.5, 12.5), (150, 12.5))
            Line((150, 12.5), (150, 57.5))
            Line((150, 57.5), (115.5, 57.5))
            ThreePointArc((115.5, 57.5), (113.37868, 56.62132), (112.5, 54.5))
            Line((112.5, 54.5), (112.5, 15.5))
            ThreePointArc((112.5, 15.5), (113.37868, 13.37868), (115.5, 12.5))
        make_face()
        with BuildLine():
            Line((115.5, -57.5), (150, -57.5))
            Line((150, -57.5), (150, -12.5))
            Line((150, -12.5), (115.5, -12.5))
            ThreePointArc((115.5, -12.5), (113.37868, -13.37868), (112.5, -15.5))
            Line((112.5, -15.5), (112.5, -54.5))
            ThreePointArc((112.5, -54.5), (113.37868, -56.62132), (115.5, -57.5))
        make_face()
        with BuildLine():
            Line((112.5, -110), (140, -110))
            ThreePointArc((140, -110), (147.071068, -107.071068), (150, -100))
            Line((150, -100), (150, -82.5))
            Line((150, -82.5), (115.5, -82.5))
            ThreePointArc((115.5, -82.5), (113.37868, -83.37868), (112.5, -85.5))
            Line((112.5, -85.5), (112.5, -110))
        make_face()
    extrude(amount=F2_DEPTH)


with BuildPart() as f3:
    # F0 (on Top) → F3 (new body)
    with BuildSketch(Plane.XY):
        with Locations((-70, -122.271573)):
            Rectangle(F0_W, F0_H)
        with BuildLine():
            ThreePointArc((-52.5, -124.771573), (-50, -122.271573), (-52.5, -119.771573))
            Line((-52.5, -119.771573), (-52.5, -124.771573))
        make_face()
        with BuildLine():
            Line((-87.5, -124.771573), (-87.5, -119.771573))
            ThreePointArc((-87.5, -119.771573), (-90, -122.271573), (-87.5, -124.771573))
        make_face()
    extrude(amount=F3_DEPTH)


solid = Compound([f1.part, f3.part])
